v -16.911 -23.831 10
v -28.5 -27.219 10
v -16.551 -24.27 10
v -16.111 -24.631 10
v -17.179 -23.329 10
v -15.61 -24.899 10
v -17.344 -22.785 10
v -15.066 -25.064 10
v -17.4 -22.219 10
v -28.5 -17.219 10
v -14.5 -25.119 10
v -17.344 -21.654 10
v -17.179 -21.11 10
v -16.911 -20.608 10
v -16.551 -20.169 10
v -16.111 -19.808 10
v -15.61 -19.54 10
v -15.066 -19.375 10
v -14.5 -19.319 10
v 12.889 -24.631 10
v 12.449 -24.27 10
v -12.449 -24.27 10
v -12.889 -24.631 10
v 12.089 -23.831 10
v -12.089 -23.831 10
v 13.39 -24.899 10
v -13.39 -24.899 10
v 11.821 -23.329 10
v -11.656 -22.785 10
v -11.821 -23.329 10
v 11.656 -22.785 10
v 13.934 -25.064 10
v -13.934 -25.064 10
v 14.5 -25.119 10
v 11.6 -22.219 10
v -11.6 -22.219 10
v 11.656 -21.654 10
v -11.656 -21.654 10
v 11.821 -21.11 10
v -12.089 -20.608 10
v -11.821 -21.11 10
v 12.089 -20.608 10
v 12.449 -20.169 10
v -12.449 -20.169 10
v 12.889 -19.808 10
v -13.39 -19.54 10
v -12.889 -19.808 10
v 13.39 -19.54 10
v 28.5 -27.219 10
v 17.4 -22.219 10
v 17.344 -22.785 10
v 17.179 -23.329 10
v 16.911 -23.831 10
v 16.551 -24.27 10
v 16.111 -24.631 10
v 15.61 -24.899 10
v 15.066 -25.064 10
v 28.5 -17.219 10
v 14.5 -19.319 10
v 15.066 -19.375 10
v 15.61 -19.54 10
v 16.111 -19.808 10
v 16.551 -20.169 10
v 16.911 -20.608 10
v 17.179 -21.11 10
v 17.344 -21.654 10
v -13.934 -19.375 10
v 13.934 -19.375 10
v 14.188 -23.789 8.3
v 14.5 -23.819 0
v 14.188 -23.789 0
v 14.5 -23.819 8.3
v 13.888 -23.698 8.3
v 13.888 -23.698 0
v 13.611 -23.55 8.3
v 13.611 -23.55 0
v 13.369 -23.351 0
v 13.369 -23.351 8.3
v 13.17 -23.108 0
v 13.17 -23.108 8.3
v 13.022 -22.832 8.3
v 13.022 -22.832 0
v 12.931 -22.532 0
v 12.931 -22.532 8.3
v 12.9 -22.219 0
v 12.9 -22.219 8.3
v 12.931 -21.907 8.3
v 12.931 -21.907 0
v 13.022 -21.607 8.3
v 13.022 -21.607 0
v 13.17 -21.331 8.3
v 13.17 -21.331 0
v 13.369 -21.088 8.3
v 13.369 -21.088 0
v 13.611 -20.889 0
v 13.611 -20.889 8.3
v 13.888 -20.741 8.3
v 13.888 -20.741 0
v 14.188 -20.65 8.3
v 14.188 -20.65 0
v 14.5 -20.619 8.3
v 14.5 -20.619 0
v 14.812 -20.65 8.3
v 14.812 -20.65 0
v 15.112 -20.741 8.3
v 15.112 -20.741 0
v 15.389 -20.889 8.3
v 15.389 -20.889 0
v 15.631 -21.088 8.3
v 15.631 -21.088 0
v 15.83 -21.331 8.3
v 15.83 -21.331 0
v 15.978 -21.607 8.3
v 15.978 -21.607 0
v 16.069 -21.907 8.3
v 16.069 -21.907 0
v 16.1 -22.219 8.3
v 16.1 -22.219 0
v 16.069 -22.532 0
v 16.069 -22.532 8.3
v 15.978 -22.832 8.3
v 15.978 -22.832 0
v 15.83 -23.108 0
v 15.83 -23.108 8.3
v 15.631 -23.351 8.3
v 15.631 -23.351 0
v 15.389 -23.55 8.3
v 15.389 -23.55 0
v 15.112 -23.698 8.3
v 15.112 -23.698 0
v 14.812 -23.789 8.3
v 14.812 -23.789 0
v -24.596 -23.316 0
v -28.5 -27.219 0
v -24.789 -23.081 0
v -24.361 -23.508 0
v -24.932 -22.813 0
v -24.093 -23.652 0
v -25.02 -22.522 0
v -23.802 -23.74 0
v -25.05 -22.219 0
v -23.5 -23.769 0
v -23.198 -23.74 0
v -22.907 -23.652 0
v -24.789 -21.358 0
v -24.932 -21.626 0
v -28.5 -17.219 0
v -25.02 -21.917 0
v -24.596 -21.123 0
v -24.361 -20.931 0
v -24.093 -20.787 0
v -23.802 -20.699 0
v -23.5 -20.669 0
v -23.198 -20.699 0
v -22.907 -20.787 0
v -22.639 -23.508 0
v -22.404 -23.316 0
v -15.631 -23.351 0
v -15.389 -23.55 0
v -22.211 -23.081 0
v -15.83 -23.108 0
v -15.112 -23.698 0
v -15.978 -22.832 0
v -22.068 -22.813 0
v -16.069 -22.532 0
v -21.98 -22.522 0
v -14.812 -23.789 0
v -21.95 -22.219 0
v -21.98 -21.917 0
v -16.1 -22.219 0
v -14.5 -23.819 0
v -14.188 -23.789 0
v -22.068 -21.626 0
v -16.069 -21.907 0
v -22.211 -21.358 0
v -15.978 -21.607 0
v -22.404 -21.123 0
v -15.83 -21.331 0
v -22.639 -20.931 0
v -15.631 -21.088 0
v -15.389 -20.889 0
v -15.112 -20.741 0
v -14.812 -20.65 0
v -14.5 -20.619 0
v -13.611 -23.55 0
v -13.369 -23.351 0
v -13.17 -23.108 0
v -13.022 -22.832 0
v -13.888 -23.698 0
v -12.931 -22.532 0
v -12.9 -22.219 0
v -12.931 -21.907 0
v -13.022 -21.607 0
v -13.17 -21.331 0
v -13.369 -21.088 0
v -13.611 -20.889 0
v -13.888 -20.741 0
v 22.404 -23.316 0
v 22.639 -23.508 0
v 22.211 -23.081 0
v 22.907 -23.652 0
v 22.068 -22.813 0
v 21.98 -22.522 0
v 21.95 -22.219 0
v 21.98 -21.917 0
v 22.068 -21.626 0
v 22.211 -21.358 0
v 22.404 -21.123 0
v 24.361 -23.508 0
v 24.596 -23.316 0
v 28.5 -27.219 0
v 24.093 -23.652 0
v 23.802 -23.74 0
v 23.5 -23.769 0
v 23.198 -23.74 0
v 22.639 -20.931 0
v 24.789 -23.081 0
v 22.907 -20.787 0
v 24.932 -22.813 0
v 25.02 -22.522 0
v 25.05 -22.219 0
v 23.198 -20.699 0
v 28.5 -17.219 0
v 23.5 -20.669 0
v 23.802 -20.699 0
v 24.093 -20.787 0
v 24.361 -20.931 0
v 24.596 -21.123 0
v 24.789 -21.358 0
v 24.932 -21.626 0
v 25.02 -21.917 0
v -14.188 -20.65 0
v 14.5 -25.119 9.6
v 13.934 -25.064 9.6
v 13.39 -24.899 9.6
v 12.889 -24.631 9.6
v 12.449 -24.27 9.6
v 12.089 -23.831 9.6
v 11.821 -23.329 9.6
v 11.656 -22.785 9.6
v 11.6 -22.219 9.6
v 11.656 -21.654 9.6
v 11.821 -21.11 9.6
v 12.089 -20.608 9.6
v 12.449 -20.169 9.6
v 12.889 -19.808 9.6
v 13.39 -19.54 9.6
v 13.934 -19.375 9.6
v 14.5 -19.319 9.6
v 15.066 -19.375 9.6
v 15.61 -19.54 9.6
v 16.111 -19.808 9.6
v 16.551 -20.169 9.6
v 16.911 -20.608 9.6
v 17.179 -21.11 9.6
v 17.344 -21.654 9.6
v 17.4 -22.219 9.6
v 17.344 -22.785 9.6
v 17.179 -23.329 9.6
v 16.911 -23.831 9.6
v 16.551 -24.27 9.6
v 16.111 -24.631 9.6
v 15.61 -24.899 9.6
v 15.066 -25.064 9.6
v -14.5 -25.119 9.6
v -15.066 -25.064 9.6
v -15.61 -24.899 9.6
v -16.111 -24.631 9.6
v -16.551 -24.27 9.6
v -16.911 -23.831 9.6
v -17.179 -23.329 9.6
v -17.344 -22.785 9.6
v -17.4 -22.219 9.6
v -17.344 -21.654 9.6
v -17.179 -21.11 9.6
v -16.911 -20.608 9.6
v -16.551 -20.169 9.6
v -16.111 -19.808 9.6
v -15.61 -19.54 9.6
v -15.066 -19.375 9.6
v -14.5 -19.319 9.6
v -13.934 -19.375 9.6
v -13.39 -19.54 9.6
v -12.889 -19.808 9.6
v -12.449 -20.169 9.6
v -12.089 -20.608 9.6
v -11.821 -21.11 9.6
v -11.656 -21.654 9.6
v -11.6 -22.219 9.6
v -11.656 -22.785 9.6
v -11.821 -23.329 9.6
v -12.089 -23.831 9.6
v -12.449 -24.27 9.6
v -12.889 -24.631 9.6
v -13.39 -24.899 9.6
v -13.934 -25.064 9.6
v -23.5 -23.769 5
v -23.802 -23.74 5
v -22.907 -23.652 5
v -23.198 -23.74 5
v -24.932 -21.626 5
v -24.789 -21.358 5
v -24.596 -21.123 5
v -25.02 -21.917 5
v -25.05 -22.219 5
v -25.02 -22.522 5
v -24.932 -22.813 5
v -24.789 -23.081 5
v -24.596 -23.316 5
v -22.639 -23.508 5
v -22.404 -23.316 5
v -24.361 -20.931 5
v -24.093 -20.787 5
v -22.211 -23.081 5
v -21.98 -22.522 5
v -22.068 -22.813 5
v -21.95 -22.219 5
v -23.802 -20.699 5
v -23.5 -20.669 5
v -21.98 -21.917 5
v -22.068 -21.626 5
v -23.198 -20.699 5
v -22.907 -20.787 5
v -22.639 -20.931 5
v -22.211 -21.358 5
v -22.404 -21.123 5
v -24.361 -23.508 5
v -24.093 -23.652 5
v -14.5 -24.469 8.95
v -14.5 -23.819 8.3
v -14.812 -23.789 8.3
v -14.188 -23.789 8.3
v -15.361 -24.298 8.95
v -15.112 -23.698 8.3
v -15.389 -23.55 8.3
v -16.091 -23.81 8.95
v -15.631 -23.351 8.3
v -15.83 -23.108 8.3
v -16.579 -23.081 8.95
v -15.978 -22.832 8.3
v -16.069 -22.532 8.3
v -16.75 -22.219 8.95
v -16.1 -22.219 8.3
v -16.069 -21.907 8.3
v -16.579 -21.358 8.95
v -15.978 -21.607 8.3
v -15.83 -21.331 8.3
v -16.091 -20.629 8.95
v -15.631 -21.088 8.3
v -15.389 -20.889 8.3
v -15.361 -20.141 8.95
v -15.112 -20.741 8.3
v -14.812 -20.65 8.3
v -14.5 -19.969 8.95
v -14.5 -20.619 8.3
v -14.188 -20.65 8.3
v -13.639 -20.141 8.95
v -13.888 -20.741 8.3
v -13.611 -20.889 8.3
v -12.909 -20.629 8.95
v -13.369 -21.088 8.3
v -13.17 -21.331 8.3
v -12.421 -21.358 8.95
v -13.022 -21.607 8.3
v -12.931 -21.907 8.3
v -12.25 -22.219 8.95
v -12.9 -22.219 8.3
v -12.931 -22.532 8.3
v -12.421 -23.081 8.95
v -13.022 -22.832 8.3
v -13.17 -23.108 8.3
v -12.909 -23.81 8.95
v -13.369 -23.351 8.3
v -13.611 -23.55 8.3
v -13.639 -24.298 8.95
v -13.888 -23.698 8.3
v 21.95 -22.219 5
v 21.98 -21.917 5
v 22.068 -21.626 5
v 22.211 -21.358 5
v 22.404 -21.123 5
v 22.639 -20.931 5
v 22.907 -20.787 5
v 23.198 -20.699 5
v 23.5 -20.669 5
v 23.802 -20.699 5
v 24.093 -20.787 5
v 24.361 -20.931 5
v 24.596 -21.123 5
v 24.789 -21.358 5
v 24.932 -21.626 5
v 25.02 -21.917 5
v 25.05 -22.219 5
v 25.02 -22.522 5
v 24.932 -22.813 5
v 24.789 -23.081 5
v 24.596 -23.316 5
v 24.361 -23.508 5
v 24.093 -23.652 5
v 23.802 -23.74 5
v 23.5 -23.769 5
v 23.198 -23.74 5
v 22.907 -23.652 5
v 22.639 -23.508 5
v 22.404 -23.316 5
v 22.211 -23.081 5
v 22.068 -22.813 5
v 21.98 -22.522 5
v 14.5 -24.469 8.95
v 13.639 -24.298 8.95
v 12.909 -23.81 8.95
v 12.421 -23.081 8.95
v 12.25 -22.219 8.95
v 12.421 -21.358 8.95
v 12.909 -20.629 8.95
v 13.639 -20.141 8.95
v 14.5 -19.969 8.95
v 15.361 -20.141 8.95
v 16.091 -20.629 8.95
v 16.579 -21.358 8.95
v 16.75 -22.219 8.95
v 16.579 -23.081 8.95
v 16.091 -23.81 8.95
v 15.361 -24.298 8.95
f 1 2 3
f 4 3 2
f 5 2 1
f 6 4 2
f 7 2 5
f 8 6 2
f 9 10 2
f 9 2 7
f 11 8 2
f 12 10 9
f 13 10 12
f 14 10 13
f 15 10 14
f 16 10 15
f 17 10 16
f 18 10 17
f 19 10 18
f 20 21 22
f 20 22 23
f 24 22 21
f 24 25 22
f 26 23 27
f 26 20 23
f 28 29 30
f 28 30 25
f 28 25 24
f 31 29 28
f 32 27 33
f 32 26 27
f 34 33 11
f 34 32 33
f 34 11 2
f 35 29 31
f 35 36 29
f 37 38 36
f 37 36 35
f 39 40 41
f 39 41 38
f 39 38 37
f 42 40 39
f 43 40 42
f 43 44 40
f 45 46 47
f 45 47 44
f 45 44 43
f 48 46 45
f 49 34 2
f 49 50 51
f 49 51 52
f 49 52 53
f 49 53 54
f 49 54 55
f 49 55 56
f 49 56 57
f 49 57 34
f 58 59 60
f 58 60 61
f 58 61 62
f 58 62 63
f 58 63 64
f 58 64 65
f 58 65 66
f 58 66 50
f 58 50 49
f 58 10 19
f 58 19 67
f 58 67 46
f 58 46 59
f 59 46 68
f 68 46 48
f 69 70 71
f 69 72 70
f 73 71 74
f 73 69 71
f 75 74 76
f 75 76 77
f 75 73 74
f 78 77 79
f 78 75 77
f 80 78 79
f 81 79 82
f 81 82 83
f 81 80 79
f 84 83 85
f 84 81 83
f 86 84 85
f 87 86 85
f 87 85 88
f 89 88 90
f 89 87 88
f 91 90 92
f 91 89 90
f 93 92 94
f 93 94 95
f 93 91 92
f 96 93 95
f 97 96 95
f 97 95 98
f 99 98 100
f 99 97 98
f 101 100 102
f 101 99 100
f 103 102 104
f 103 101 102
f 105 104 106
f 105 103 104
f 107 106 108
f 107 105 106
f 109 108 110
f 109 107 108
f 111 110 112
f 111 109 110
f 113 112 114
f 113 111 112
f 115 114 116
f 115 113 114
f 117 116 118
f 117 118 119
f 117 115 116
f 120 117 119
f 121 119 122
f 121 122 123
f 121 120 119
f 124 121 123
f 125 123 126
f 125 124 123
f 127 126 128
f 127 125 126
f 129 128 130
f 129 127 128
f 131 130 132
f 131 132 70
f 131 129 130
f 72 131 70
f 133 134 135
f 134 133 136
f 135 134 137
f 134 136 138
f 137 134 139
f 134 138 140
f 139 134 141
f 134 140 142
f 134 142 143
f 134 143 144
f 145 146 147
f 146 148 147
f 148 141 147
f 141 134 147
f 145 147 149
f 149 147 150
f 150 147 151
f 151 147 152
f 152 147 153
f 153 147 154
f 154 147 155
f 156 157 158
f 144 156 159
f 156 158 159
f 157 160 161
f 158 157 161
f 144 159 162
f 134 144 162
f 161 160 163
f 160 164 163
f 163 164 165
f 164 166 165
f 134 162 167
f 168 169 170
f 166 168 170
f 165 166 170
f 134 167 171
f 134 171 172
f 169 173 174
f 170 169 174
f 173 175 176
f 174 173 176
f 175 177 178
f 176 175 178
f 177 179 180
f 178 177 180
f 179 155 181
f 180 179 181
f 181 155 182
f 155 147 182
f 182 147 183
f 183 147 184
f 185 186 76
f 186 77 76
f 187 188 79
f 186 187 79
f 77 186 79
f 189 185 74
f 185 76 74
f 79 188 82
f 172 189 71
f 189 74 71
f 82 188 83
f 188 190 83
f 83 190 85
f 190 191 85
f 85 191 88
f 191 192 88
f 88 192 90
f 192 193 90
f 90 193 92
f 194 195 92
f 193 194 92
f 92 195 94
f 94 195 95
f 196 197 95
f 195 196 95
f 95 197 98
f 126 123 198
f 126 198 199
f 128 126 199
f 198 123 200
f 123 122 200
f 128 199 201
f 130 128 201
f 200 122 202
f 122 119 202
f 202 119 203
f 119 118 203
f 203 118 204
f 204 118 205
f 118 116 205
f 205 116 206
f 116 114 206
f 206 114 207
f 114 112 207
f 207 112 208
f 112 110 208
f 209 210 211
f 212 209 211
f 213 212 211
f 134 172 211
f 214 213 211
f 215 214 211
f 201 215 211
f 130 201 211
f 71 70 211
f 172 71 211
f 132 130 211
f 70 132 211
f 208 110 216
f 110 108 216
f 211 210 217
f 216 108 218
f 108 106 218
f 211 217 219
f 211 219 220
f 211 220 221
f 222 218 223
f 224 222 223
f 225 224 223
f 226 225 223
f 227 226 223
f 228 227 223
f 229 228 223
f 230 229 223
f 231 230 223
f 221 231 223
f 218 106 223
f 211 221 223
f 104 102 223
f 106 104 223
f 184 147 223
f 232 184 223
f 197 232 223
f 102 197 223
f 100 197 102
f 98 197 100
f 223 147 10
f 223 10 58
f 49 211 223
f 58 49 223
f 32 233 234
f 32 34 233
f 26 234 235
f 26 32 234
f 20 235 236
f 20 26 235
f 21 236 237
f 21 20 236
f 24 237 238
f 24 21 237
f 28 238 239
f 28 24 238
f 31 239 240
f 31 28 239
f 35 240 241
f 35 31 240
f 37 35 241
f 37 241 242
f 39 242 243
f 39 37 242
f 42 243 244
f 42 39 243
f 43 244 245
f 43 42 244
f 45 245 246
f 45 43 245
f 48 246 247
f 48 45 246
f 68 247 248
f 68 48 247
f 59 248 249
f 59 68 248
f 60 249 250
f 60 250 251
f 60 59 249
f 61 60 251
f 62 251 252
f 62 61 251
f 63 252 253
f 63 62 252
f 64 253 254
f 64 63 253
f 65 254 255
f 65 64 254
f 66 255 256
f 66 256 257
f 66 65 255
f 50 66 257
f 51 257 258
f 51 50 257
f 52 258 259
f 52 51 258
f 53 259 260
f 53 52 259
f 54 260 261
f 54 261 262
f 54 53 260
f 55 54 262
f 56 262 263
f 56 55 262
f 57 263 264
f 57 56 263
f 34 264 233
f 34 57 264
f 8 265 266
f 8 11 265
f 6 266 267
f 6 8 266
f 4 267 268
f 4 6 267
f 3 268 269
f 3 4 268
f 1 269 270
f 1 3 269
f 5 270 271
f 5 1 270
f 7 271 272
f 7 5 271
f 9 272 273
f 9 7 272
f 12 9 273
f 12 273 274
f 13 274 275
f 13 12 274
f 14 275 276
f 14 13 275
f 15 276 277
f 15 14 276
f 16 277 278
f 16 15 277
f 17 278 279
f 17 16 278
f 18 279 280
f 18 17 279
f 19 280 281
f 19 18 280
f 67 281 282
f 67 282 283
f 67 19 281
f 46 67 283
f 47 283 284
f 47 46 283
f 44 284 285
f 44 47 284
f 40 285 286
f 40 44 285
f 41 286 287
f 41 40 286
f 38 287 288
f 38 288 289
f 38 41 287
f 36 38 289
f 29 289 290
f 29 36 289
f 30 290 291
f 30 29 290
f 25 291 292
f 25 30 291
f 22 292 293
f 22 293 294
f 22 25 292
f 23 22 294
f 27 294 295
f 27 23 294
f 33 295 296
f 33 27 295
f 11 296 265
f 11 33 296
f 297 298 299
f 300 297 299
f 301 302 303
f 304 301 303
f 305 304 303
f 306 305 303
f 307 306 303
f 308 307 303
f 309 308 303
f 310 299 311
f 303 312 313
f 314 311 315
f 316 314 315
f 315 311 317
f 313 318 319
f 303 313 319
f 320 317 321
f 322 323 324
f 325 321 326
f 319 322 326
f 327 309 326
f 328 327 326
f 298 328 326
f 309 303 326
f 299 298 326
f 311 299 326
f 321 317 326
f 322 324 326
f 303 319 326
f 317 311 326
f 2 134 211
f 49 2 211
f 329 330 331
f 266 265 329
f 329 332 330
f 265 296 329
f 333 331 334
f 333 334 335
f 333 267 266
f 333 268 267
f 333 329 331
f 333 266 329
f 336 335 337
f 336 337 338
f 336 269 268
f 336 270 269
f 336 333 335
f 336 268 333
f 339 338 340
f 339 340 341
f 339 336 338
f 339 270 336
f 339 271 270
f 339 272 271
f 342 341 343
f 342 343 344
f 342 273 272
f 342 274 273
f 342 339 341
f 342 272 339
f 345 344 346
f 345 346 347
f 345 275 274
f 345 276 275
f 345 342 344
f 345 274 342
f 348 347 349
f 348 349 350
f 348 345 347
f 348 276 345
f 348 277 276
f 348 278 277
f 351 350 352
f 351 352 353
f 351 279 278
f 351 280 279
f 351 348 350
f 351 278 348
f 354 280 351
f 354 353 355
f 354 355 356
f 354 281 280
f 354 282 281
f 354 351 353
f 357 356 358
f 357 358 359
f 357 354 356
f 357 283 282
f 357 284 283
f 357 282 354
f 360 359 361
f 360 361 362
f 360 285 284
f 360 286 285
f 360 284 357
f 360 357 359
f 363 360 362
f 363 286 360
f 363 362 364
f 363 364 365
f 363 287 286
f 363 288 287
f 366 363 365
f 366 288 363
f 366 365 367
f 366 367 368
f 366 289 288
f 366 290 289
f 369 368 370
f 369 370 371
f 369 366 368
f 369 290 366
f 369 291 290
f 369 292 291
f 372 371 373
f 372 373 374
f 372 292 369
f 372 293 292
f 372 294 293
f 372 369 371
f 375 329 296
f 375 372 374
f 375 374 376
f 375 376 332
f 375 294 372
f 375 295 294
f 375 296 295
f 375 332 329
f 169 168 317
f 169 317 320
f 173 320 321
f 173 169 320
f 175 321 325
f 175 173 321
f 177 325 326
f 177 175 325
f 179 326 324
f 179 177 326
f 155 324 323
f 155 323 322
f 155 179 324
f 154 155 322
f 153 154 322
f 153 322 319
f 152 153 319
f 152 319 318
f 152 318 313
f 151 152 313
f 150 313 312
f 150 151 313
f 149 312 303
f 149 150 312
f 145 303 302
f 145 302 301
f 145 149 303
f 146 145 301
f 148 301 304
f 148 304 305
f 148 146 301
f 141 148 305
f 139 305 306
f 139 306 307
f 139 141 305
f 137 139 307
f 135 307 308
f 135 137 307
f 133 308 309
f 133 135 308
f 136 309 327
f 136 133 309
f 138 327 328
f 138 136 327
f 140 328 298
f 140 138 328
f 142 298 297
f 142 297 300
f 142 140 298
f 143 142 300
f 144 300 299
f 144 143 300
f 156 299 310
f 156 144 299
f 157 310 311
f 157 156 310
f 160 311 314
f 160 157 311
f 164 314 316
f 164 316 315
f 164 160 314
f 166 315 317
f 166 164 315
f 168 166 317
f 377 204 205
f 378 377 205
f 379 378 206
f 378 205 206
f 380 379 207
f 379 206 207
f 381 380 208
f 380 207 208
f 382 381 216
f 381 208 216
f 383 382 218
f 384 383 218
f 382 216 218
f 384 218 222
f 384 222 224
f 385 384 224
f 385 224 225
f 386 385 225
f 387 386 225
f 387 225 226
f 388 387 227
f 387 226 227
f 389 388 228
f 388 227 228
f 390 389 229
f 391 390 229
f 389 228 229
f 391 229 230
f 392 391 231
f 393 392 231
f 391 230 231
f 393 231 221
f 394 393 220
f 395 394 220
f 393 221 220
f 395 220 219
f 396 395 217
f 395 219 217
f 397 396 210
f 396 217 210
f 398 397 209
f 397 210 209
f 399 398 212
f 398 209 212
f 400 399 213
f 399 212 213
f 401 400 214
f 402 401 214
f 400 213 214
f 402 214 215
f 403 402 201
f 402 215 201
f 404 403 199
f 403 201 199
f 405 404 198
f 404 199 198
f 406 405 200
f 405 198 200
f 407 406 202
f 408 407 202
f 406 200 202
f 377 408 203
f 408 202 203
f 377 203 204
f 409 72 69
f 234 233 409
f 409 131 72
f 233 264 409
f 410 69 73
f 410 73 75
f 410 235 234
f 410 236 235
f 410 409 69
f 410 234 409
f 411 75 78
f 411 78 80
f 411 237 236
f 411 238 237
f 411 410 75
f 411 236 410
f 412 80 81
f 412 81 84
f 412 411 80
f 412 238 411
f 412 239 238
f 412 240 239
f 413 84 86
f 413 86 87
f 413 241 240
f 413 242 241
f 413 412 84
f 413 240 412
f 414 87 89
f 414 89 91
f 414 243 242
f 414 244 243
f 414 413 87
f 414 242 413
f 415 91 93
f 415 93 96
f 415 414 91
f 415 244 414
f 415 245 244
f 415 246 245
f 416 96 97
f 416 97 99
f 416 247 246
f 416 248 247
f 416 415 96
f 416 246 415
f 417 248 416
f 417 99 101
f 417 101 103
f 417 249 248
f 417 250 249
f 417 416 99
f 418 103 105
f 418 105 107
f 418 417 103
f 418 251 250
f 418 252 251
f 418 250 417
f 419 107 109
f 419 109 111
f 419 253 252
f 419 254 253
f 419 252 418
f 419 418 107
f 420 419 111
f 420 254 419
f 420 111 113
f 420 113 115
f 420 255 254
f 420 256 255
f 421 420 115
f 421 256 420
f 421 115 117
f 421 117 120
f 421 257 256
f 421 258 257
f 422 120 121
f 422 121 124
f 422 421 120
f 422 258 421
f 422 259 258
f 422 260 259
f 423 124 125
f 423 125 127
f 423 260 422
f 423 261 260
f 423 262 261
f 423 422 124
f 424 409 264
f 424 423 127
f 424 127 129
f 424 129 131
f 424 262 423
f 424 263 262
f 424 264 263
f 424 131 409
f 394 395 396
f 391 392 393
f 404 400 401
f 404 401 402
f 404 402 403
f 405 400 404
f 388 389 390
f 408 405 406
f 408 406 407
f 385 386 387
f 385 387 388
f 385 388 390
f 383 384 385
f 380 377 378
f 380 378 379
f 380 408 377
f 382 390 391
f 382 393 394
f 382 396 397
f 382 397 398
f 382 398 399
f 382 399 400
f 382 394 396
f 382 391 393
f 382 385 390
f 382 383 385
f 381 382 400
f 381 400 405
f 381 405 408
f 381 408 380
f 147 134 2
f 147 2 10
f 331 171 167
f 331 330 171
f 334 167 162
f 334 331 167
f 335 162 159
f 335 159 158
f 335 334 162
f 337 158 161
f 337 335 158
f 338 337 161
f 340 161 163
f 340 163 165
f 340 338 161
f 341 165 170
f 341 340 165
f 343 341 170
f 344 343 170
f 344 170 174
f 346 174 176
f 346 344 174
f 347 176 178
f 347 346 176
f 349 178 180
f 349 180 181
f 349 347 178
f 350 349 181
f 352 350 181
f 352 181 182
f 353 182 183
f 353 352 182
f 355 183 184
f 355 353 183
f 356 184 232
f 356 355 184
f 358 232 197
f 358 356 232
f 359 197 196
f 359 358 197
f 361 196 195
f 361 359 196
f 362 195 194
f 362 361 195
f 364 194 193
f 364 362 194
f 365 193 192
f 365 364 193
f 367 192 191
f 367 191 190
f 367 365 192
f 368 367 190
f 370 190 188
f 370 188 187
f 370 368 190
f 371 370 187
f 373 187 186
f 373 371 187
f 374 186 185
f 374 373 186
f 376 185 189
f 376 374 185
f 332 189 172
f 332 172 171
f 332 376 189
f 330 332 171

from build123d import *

# Parameters (mm, degrees)
ESQUISSE1_W                              = 57
ESQUISSE1_H                              = 10
BOSS_EXTRU_1_DEPTH                       = 10
FRAISAGE_POUR_VIS_T_TE_FRAIS_E_6_2_COUNT = 2
FRAISAGE_POUR_VIS_T_TE_FRAIS_E_6_2_PITCH = 29
ESQUISSE8_R                              = 1.55
ENL_V_MAT_EXTRU_1_DEPTH                  = 5


with BuildPart() as part:
    # Esquisse1 → Boss.-Extru.1 (new body)
    with BuildSketch(Plane.XY):
        with Locations((0, -22.219493411)):
            Rectangle(ESQUISSE1_W, ESQUISSE1_H)
    extrude(amount=BOSS_EXTRU_1_DEPTH)

    # Esquisse6 → Fraisage pour vis à tête fraisée à 6 pans creux M31 (revolve, cut)
    with BuildSketch(Plane(origin=(-14.5, -22.219493411, 10), x_dir=(0, -1, 0), z_dir=(1, 0, 0))):
        Polygon((0, 0), (0, 10), (1.6, 10), (1.6, 1.7), (2.9, 0.4), (2.9, 0), align=None)
    fraisage_pour_vis_t_te_frais_e_6_pan = revolve(axis=Axis((-14.5, -22.219493411, 16.35), (0, 0, -1)), mode=Mode.SUBTRACT)

    # Fraisage pour vis _ t_te frais_e _ 6 2: Fraisage pour vis à tête fraisée à 6 pans creux M31 ×2
    with Locations(*[(i * FRAISAGE_POUR_VIS_T_TE_FRAIS_E_6_2_PITCH, 0, 0) for i in range(1, FRAISAGE_POUR_VIS_T_TE_FRAIS_E_6_2_COUNT)]):
        add(fraisage_pour_vis_t_te_frais_e_6_pan, mode=Mode.SUBTRACT)

    # Esquisse8 → Enlèv. mat.-Extru.1 (cut)
    with BuildSketch(Plane(origin=(0, 0, 0), x_dir=(-1, 0, 0), z_dir=(0, 0, -1))):
        with Locations((-23.5, -22.219493411)):
            Circle(ESQUISSE8_R)
    enl_v_mat_extru_1 = extrude(amount=-ENL_V_MAT_EXTRU_1_DEPTH, mode=Mode.SUBTRACT)

    # Symétrie1: Enlèv. mat.-Extru.1 across plane
    add(enl_v_mat_extru_1.mirror(Plane(origin=(0, 0, 0), x_dir=(0, 0, 1), z_dir=(1, 0, 0))), mode=Mode.SUBTRACT)


solid = part.part
